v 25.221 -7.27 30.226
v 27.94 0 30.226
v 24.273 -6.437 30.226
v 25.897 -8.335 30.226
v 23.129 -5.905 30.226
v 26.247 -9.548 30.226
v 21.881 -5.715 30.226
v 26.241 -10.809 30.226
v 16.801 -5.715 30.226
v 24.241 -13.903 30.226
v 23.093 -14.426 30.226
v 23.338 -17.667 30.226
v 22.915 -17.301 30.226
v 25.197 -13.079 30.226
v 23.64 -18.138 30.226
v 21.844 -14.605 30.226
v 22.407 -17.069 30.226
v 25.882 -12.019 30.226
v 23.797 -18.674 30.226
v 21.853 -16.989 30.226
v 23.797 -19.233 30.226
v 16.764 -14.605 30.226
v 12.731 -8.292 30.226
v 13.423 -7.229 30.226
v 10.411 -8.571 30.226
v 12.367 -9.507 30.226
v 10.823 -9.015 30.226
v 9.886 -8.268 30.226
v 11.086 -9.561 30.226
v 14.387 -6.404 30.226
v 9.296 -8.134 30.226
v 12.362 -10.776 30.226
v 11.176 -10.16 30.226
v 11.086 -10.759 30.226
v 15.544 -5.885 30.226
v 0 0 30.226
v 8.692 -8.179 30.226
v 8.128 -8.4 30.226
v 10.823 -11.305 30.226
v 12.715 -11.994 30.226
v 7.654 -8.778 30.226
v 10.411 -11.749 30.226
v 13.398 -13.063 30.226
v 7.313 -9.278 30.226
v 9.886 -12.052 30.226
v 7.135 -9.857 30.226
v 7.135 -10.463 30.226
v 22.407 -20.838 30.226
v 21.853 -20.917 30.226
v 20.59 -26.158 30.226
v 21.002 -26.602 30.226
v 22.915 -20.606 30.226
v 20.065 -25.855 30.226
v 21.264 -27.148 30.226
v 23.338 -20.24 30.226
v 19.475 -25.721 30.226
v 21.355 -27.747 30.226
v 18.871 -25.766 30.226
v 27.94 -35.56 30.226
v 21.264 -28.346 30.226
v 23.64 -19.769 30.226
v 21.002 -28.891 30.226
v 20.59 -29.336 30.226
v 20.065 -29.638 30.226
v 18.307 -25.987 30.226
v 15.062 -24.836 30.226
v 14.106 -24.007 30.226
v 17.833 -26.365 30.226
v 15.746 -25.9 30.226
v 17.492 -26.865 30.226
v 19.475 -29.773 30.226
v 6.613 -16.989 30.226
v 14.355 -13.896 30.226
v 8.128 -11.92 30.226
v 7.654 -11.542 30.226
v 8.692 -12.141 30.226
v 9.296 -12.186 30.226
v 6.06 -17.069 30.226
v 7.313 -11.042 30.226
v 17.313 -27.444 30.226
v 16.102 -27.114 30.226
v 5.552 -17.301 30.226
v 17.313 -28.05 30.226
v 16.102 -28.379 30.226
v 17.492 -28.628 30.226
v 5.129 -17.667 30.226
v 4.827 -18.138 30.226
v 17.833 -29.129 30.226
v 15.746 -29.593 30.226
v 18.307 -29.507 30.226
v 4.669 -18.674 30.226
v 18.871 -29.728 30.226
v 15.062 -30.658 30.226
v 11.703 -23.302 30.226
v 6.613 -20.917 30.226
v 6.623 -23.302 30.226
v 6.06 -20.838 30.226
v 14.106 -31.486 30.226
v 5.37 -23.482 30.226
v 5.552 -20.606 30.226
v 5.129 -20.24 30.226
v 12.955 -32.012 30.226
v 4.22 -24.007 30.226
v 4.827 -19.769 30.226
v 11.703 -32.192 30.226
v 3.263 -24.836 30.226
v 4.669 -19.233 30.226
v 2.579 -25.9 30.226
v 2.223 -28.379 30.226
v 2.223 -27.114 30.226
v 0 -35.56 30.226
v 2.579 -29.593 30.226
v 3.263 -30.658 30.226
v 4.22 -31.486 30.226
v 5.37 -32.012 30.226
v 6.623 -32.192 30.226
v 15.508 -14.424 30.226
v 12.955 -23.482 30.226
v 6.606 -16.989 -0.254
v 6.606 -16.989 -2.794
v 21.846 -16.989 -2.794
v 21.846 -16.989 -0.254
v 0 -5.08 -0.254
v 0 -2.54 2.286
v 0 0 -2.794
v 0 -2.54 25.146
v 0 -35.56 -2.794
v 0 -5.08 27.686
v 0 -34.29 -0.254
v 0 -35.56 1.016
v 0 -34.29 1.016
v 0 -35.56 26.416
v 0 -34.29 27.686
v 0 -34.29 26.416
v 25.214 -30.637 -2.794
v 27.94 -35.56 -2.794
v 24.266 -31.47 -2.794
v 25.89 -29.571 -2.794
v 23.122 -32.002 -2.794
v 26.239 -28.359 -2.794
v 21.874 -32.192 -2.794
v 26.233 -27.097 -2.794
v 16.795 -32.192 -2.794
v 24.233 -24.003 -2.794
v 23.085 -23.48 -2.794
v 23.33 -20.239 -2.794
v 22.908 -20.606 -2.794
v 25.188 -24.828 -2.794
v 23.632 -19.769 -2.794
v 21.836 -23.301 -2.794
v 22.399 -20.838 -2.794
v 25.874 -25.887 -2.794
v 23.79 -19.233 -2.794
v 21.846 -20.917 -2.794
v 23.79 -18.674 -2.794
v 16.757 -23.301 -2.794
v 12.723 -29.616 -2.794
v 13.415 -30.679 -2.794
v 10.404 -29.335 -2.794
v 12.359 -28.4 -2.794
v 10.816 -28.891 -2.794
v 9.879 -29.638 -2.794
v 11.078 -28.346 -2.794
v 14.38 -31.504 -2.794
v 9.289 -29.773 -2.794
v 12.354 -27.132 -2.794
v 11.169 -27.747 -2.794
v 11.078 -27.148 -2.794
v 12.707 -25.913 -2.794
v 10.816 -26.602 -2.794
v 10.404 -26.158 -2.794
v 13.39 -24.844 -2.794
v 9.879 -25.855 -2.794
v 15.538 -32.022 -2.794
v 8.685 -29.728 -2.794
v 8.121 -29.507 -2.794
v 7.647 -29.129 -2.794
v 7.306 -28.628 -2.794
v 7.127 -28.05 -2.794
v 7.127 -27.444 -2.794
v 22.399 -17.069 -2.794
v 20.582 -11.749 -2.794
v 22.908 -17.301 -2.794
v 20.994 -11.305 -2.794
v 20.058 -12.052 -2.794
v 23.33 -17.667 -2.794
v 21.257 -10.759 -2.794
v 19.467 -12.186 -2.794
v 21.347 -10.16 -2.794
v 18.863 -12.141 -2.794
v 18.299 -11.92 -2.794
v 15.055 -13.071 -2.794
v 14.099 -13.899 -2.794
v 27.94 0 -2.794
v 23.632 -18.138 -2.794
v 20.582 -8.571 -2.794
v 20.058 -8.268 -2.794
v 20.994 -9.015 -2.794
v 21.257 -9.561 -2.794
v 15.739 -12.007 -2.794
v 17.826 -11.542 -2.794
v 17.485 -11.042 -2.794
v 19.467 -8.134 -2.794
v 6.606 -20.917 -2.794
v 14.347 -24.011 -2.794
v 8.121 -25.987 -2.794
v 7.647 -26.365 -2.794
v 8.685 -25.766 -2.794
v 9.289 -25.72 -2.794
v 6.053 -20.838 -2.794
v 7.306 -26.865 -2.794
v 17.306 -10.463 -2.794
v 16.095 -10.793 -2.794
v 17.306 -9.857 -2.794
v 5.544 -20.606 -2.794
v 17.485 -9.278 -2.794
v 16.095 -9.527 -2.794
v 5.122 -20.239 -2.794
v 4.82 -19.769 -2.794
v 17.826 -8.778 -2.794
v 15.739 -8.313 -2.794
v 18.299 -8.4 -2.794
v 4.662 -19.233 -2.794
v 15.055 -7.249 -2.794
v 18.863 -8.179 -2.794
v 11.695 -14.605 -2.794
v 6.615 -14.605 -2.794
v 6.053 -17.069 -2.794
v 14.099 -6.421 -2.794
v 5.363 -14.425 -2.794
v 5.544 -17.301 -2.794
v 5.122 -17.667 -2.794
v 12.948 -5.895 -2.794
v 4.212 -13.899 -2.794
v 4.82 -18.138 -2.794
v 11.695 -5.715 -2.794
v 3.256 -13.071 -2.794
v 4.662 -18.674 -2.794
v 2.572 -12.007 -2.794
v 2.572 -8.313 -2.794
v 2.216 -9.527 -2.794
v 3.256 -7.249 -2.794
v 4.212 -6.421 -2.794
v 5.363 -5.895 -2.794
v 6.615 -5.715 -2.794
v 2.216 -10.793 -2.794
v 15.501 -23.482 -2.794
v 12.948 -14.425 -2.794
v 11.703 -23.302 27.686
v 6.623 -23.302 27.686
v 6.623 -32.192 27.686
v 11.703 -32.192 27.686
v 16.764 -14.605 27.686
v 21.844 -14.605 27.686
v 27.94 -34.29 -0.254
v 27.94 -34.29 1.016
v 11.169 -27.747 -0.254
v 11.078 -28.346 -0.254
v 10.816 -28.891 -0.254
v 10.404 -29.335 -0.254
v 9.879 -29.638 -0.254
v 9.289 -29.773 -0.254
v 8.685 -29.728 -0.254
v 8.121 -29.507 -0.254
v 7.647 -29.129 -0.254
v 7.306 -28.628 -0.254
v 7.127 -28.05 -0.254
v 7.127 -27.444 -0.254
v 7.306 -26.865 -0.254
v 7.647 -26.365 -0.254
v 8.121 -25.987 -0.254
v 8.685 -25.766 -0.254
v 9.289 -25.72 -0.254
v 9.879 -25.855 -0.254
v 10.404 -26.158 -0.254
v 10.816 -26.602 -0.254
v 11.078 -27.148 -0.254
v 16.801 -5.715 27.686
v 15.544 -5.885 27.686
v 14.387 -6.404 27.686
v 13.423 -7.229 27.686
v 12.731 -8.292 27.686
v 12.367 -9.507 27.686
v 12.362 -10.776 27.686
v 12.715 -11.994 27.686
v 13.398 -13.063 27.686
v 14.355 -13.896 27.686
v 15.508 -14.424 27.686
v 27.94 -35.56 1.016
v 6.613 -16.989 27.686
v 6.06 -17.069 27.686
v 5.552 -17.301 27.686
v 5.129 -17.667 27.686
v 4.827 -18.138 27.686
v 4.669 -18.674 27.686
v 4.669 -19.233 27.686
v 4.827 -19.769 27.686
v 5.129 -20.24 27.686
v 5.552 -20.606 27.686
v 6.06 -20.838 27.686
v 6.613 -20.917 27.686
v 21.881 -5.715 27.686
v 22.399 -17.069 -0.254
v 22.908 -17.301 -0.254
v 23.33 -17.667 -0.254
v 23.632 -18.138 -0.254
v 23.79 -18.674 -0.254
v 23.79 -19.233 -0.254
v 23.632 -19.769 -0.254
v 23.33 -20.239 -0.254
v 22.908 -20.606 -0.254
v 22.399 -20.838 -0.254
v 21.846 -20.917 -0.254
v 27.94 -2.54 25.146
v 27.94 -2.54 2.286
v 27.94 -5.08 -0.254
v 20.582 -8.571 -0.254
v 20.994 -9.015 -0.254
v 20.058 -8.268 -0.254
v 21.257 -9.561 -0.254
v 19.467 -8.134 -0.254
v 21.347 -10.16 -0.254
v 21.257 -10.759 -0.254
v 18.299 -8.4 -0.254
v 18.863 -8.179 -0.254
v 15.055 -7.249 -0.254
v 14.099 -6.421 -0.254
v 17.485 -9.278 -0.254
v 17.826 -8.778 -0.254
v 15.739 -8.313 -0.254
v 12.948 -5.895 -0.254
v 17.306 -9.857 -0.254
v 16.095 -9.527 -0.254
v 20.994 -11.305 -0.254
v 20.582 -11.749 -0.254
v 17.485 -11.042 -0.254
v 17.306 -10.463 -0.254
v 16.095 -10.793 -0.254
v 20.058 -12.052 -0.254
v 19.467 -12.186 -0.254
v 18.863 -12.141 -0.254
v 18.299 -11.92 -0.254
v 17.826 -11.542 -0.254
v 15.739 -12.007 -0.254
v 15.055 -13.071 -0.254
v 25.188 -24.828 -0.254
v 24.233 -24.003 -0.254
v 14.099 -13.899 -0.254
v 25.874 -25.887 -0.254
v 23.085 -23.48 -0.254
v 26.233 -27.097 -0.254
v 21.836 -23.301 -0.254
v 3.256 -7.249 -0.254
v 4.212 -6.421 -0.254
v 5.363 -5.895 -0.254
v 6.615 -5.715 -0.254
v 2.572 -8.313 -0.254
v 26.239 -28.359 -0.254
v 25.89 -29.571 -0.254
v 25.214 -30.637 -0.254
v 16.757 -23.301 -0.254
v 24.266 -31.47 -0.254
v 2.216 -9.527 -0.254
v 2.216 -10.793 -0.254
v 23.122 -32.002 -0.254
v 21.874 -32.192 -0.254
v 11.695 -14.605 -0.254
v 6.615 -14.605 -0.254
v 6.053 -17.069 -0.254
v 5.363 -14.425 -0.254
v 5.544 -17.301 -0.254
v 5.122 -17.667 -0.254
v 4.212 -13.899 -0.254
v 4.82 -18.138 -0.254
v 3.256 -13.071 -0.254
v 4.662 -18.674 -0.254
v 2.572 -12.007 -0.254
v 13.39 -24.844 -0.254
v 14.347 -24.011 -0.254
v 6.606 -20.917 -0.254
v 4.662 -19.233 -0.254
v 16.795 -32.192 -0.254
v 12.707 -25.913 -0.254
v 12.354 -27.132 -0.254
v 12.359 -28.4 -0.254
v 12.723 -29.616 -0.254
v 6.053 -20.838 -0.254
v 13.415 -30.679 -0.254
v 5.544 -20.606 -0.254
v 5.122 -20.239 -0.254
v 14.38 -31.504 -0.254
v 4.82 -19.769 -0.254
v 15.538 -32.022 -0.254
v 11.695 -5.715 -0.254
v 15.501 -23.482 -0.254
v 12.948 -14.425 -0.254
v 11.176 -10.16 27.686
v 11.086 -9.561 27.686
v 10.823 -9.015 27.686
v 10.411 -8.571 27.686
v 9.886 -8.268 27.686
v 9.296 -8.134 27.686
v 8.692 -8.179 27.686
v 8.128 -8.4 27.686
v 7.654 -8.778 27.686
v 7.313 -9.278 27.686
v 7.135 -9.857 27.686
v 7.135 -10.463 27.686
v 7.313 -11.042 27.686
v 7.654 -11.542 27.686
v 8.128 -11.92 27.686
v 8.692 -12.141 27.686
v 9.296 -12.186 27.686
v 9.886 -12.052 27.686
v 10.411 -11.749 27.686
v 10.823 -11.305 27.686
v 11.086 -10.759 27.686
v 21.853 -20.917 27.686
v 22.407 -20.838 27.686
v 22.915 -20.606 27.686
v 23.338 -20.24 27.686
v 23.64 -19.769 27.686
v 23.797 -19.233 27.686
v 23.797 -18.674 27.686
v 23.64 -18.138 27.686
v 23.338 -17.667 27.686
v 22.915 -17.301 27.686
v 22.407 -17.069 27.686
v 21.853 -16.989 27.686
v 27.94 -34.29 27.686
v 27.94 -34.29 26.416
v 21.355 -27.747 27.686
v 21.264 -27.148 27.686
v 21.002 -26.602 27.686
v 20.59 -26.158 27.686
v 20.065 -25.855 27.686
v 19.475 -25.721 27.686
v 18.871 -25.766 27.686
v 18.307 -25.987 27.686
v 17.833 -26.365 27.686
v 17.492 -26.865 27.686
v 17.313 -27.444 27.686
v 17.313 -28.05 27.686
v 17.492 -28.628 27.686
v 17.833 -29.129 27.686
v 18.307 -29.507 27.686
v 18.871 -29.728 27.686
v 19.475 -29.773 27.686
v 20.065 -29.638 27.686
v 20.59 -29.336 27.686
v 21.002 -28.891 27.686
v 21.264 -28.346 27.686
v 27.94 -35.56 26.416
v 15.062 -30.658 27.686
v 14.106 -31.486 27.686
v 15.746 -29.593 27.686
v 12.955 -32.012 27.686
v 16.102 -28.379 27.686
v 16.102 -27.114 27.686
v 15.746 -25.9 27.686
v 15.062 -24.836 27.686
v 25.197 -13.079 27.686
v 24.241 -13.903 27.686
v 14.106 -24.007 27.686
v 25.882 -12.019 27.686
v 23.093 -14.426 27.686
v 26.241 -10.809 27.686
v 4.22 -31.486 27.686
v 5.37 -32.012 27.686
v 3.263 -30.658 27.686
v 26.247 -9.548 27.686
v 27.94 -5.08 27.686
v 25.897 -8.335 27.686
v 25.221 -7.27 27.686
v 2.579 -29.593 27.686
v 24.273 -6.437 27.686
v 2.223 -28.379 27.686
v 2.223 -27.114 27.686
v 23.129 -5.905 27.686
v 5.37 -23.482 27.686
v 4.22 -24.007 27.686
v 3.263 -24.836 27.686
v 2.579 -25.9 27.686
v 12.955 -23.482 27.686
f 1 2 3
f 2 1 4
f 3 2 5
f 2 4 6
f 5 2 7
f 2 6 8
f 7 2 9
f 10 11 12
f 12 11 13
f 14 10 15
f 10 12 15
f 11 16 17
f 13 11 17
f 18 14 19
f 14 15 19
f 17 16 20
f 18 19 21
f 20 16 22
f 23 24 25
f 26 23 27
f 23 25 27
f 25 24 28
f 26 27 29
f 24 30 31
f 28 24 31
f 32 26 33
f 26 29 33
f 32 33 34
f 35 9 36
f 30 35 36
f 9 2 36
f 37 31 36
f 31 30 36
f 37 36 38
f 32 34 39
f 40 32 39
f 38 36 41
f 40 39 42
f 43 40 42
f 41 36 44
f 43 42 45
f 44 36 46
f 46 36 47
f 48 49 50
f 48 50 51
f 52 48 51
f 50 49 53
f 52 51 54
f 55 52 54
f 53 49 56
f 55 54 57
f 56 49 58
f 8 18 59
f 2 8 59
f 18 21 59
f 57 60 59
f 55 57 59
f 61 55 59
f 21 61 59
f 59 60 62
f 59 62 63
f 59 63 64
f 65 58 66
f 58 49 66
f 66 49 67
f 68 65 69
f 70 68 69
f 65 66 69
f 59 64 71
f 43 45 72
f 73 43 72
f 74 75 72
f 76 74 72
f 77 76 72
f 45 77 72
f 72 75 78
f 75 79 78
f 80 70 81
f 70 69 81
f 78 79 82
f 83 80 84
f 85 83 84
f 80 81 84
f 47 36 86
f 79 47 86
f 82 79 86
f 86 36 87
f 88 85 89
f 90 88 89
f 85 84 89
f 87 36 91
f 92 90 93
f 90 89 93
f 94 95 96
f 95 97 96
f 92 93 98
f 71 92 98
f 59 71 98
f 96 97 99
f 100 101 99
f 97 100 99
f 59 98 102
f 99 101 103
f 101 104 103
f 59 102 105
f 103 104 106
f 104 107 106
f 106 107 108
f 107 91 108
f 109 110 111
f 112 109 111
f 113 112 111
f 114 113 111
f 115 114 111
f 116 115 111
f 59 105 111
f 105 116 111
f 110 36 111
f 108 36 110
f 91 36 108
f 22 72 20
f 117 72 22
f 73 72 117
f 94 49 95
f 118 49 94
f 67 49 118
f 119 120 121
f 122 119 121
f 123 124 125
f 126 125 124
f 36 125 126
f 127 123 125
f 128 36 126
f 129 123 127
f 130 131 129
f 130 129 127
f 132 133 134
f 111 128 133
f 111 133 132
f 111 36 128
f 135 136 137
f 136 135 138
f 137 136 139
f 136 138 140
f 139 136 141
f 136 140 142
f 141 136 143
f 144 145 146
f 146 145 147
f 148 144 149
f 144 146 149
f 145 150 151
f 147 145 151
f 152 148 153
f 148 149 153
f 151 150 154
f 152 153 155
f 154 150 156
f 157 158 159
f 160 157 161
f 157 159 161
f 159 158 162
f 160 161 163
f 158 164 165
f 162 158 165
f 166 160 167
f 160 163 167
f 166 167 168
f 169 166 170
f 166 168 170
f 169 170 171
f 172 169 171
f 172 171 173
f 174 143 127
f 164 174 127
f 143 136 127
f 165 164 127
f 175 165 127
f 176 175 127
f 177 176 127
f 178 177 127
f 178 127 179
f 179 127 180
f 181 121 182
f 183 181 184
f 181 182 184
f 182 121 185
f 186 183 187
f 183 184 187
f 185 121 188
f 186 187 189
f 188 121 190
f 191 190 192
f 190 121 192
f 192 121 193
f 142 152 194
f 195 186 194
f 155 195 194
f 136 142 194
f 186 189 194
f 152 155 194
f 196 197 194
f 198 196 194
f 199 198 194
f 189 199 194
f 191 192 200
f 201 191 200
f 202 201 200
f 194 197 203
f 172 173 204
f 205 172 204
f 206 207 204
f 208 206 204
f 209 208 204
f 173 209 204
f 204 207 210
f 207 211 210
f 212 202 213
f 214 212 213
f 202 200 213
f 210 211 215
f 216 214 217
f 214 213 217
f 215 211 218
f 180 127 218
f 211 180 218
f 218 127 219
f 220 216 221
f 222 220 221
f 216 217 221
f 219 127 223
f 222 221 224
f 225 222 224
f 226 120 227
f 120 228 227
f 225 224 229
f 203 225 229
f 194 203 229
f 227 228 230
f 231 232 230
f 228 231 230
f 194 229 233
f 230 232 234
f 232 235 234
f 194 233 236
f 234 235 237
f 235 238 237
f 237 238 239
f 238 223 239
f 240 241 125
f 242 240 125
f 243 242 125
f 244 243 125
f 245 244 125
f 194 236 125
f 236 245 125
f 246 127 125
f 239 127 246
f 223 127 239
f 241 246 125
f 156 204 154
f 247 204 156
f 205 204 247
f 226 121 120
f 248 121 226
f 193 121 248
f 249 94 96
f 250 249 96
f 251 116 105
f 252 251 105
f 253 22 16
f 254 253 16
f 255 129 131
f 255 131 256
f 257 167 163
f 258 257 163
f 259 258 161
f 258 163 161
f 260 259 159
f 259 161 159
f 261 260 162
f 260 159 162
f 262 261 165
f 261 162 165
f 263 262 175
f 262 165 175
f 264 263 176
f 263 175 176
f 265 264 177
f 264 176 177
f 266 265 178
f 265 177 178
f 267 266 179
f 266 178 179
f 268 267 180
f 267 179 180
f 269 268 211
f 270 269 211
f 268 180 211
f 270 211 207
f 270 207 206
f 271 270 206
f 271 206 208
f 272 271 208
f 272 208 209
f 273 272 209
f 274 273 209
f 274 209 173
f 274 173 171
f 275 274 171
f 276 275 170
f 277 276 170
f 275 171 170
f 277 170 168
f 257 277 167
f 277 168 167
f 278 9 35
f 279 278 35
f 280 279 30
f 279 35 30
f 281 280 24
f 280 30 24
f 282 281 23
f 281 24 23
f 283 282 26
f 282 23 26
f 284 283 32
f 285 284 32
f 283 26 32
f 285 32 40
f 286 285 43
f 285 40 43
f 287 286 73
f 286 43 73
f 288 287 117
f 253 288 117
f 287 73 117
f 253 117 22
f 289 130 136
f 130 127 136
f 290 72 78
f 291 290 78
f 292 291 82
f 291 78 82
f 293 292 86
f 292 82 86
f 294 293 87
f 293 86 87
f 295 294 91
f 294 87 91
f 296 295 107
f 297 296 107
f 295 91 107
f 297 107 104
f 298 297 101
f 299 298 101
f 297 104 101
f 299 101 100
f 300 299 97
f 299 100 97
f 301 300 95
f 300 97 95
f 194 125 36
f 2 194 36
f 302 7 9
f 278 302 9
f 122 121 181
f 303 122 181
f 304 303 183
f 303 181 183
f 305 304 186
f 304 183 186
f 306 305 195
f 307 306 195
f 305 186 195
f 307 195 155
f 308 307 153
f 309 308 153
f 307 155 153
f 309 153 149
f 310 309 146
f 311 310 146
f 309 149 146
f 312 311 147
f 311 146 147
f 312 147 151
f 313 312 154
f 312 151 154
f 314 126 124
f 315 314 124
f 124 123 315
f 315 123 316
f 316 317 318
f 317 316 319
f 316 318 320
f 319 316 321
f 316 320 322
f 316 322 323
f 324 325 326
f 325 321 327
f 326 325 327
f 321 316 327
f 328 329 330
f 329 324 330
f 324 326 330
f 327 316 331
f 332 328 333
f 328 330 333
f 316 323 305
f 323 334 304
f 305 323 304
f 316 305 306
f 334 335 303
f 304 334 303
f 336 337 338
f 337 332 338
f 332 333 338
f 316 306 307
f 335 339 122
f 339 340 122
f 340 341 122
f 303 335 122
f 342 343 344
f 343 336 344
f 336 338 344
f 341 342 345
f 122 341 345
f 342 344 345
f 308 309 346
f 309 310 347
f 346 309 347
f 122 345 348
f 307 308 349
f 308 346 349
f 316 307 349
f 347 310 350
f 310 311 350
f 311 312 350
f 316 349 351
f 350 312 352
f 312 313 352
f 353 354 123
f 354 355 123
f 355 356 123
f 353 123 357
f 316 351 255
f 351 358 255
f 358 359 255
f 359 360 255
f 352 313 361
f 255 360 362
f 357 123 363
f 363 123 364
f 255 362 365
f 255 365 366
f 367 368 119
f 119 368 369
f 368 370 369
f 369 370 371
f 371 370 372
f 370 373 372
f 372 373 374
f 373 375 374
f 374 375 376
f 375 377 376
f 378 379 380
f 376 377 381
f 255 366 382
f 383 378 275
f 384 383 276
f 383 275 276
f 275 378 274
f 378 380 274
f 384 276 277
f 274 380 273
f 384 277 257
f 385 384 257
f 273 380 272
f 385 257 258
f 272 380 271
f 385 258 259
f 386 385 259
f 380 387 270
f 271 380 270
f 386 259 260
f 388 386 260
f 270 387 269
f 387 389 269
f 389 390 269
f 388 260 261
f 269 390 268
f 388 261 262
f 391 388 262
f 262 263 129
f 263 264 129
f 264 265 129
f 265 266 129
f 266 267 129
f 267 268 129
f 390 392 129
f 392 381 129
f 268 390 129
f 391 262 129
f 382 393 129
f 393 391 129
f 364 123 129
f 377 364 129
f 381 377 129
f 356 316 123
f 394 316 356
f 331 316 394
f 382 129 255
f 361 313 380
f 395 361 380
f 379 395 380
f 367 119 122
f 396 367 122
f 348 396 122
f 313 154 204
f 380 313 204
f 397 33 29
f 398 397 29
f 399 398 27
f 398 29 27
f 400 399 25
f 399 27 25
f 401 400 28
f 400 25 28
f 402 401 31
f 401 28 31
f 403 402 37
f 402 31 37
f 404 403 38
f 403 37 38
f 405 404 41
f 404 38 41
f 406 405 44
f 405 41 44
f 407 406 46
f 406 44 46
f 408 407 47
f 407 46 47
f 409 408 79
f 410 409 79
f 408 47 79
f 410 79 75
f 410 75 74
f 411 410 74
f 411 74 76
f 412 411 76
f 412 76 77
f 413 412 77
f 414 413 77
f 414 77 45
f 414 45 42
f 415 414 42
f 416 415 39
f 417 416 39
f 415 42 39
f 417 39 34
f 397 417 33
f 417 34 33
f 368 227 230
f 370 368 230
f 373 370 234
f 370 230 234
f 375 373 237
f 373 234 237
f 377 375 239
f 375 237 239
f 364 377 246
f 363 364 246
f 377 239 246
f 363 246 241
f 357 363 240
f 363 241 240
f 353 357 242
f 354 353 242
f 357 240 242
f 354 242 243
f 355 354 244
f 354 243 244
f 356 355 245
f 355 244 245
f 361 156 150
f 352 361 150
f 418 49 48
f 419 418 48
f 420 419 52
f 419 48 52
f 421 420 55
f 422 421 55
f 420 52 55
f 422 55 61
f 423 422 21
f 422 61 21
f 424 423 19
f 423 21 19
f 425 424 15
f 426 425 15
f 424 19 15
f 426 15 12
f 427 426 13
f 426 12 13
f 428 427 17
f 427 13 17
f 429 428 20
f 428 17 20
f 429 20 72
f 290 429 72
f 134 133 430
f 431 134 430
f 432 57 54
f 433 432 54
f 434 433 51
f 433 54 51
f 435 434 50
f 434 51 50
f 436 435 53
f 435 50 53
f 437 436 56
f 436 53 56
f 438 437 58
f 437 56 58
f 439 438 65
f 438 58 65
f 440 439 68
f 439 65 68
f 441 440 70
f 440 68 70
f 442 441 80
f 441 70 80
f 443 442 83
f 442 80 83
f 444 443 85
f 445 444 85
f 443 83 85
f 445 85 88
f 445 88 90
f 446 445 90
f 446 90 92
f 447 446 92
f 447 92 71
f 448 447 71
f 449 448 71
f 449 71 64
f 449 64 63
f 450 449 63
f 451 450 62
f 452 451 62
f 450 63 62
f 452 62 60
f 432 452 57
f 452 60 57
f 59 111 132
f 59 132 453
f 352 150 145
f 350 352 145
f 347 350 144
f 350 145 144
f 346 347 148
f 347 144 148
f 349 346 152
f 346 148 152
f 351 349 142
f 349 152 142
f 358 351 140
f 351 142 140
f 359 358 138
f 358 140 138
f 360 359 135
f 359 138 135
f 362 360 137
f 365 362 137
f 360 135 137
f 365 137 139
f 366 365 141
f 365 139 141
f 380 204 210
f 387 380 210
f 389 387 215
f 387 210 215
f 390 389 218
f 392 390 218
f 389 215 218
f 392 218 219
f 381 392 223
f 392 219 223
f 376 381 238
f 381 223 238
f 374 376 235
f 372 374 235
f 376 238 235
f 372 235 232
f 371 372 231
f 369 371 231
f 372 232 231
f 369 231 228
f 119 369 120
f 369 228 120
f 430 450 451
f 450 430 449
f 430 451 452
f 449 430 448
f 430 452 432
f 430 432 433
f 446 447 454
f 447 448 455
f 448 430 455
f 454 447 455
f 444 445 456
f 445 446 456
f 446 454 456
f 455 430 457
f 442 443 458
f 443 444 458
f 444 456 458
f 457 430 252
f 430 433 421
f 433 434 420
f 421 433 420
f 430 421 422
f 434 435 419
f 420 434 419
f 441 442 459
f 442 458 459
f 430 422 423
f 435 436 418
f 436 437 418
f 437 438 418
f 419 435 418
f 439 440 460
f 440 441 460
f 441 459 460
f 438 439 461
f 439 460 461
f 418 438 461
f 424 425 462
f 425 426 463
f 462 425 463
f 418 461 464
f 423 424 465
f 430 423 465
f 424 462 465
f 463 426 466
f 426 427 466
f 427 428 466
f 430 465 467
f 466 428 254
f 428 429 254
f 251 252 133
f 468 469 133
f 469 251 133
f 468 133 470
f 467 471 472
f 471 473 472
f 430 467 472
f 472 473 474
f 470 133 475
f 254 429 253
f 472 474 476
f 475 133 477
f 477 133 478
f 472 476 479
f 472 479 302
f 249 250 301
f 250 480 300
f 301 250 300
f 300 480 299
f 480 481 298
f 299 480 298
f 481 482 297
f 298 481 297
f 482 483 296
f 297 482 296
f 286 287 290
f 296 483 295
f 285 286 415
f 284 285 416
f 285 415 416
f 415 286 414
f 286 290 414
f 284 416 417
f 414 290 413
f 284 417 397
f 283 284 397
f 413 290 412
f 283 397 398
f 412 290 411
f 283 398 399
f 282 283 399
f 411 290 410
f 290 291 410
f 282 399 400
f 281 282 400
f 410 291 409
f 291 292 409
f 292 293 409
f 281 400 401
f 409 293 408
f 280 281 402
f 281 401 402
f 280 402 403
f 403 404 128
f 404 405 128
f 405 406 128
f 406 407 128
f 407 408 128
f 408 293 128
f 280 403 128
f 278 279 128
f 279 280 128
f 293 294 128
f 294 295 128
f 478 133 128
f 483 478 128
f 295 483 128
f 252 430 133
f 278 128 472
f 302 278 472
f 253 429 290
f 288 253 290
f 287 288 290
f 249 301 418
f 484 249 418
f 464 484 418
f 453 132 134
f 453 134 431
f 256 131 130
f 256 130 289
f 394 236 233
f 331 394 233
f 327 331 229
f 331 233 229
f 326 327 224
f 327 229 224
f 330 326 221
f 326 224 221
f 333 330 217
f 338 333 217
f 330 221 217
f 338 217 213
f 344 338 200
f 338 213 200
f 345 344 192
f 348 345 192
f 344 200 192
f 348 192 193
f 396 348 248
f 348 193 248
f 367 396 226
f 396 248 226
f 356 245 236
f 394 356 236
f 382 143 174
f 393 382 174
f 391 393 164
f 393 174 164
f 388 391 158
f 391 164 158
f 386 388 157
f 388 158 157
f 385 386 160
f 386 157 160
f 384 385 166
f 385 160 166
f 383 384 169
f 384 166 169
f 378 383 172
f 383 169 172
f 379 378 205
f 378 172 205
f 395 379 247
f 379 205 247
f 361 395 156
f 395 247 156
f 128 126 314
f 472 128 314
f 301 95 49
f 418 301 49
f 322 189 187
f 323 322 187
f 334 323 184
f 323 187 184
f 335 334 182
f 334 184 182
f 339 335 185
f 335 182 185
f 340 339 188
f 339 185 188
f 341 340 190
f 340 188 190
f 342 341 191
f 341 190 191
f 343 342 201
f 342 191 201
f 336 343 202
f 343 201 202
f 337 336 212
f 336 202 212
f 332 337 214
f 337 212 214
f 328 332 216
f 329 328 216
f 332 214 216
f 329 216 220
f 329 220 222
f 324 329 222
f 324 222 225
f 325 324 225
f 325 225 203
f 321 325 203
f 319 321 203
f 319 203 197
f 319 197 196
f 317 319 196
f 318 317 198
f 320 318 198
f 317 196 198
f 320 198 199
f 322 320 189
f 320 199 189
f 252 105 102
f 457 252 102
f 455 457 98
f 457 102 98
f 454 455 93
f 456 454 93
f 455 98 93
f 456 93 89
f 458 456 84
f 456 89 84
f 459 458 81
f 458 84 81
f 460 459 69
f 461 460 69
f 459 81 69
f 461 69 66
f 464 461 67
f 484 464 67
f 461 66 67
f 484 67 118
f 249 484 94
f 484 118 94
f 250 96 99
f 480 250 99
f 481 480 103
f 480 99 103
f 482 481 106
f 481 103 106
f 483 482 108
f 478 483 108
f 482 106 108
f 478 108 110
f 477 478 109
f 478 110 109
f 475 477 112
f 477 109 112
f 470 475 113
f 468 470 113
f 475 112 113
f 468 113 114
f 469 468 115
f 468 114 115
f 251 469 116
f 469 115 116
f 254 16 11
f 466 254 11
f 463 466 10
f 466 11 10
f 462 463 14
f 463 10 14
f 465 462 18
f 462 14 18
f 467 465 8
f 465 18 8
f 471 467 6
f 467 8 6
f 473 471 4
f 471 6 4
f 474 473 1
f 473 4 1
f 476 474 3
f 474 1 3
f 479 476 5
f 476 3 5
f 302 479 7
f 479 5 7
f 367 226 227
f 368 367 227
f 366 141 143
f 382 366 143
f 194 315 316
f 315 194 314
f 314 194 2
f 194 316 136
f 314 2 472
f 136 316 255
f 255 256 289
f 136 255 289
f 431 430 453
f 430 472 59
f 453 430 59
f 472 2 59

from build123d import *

# Parameters (mm, degrees)
F1_DEPTH  = 27.94
F2_R      = 2.032
F3_DEPTH  = 2.54
F4_R      = 2.032
F5_DEPTH  = 2.54
F6_SIZE   = 2.54
F7_W      = 27.94
F7_H      = 1.27
F8_DEPTH  = 1.27
F9_W      = 27.94
F9_H      = 1.27
F10_DEPTH = 1.27


with BuildPart() as f1:
    # F0 (on Right) → F1 (new body)
    with BuildSketch(Plane.YZ):
        Polygon((0, 30.226001516), (-35.56, 30.226001516), (-35.56, 27.686001516), (-2.54, 27.686001516), (-2.54, -0.253998484), (-35.56, -0.253998484), (-35.56, -2.793998484), (0, -2.793998484), align=None)
    extrude(amount=F1_DEPTH)

    # F2 (on face) → F3 (cut, through all)
    with BuildSketch(Plane.XY.offset(30.226001516)):
        with Locations((9.144, -10.16)):
            Circle(F2_R)
        with Locations((19.3227036137, -27.7468244076)):
            Circle(F2_R)
        with BuildLine():
            Line((21.8533518069, -16.9894844152), (6.6133518069, -16.9894844152))
            ThreePointArc((6.6133518069, -16.9894844152), (4.6494240183, -18.9534122038), (6.6133518069, -20.9173399924))
            Line((6.6133518069, -20.9173399924), (21.8533518069, -20.9173399924))
            ThreePointArc((21.8533518069, -20.9173399924), (23.8172795954, -18.9534122038), (21.8533518069, -16.9894844152))
        make_face()
        with BuildLine():
            ThreePointArc((21.8439999996, -14.605), (26.2890393498, -10.1786250789), (21.8814072278, -5.715))
            Line((21.8814072278, -5.715), (16.8014072278, -5.715))
            ThreePointArc((16.8014072278, -5.715), (12.3189606494, -10.1412175195), (16.7639999996, -14.605))
            Line((16.7639999996, -14.605), (21.8439999996, -14.605))
        make_face()
        with BuildLine():
            ThreePointArc((11.7027036137, -32.1918244076), (16.1477036137, -27.7468244076), (11.7027036137, -23.3018244076))
            Line((11.7027036137, -23.3018244076), (6.6227036137, -23.3018244076))
            ThreePointArc((6.6227036137, -23.3018244076), (2.1777036137, -27.7468244076), (6.6227036137, -32.1918244076))
            Line((6.6227036137, -32.1918244076), (11.7027036137, -32.1918244076))
        make_face()
    extrude(amount=-F3_DEPTH, mode=Mode.SUBTRACT)

    # F4 (on face) → F5 (cut, through all)
    with BuildSketch(Plane(origin=(0, 0, -2.793998484), x_dir=(1, 0, 0), z_dir=(0, 0, -1))):
        with Locations((9.1366654938, 27.746792541)):
            Circle(F4_R)
        with Locations((19.3154241667, 10.16)):
            Circle(F4_R)
        with BuildLine():
            Line((21.8460448303, 20.9173240591), (6.6060448303, 20.9173240591))
            ThreePointArc((6.6060448303, 20.9173240591), (4.6421170417, 18.9533962705), (6.6060448303, 16.9894684819))
            Line((6.6060448303, 16.9894684819), (21.8460448303, 16.9894684819))
            ThreePointArc((21.8460448303, 16.9894684819), (23.8099726188, 18.9533962705), (21.8460448303, 20.9173240591))
        make_face()
        with BuildLine():
            ThreePointArc((21.8356585741, 23.3013725448), (26.2811203019, 27.7276136907), (21.8741828399, 32.1922125373))
            Line((21.8741828399, 32.1922125373), (16.7951897592, 32.1922125373))
            ThreePointArc((16.7951897592, 32.1922125373), (12.3112037656, 27.7661383181), (16.7566654934, 23.3013725448))
            Line((16.7566654934, 23.3013725448), (21.8356585741, 23.3013725448))
        make_face()
        with BuildLine():
            ThreePointArc((11.6954241667, 5.715), (16.1404241667, 10.16), (11.6954241667, 14.605))
            Line((11.6954241667, 14.605), (6.6154241667, 14.605))
            ThreePointArc((6.6154241667, 14.605), (2.1704241667, 10.16), (6.6154241667, 5.715))
            Line((6.6154241667, 5.715), (11.6954241667, 5.715))
        make_face()
    extrude(amount=-F5_DEPTH, mode=Mode.SUBTRACT)

    # F6
    f6_edges = [f1.edges().sort_by_distance(p)[0] for p in [
        (13.97, -2.54, -0.253998),
        (13.97, -2.54, 27.686002),
    ]]
    chamfer(f6_edges, length=F6_SIZE)

    # F7 (on face) → F8 (join)
    with BuildSketch(Plane.XY.offset(-0.253998484)):
        with Locations((13.97, -34.925)):
            Rectangle(F7_W, F7_H)
    extrude(amount=F8_DEPTH)

    # F9 (on face) → F10 (join)
    with BuildSketch(Plane(origin=(0, 0, 27.686001516), x_dir=(1, 0, 0), z_dir=(0, 0, -1))):
        with Locations((13.97, 34.925)):
            Rectangle(F9_W, F9_H)
    extrude(amount=F10_DEPTH)


solid = f1.part
